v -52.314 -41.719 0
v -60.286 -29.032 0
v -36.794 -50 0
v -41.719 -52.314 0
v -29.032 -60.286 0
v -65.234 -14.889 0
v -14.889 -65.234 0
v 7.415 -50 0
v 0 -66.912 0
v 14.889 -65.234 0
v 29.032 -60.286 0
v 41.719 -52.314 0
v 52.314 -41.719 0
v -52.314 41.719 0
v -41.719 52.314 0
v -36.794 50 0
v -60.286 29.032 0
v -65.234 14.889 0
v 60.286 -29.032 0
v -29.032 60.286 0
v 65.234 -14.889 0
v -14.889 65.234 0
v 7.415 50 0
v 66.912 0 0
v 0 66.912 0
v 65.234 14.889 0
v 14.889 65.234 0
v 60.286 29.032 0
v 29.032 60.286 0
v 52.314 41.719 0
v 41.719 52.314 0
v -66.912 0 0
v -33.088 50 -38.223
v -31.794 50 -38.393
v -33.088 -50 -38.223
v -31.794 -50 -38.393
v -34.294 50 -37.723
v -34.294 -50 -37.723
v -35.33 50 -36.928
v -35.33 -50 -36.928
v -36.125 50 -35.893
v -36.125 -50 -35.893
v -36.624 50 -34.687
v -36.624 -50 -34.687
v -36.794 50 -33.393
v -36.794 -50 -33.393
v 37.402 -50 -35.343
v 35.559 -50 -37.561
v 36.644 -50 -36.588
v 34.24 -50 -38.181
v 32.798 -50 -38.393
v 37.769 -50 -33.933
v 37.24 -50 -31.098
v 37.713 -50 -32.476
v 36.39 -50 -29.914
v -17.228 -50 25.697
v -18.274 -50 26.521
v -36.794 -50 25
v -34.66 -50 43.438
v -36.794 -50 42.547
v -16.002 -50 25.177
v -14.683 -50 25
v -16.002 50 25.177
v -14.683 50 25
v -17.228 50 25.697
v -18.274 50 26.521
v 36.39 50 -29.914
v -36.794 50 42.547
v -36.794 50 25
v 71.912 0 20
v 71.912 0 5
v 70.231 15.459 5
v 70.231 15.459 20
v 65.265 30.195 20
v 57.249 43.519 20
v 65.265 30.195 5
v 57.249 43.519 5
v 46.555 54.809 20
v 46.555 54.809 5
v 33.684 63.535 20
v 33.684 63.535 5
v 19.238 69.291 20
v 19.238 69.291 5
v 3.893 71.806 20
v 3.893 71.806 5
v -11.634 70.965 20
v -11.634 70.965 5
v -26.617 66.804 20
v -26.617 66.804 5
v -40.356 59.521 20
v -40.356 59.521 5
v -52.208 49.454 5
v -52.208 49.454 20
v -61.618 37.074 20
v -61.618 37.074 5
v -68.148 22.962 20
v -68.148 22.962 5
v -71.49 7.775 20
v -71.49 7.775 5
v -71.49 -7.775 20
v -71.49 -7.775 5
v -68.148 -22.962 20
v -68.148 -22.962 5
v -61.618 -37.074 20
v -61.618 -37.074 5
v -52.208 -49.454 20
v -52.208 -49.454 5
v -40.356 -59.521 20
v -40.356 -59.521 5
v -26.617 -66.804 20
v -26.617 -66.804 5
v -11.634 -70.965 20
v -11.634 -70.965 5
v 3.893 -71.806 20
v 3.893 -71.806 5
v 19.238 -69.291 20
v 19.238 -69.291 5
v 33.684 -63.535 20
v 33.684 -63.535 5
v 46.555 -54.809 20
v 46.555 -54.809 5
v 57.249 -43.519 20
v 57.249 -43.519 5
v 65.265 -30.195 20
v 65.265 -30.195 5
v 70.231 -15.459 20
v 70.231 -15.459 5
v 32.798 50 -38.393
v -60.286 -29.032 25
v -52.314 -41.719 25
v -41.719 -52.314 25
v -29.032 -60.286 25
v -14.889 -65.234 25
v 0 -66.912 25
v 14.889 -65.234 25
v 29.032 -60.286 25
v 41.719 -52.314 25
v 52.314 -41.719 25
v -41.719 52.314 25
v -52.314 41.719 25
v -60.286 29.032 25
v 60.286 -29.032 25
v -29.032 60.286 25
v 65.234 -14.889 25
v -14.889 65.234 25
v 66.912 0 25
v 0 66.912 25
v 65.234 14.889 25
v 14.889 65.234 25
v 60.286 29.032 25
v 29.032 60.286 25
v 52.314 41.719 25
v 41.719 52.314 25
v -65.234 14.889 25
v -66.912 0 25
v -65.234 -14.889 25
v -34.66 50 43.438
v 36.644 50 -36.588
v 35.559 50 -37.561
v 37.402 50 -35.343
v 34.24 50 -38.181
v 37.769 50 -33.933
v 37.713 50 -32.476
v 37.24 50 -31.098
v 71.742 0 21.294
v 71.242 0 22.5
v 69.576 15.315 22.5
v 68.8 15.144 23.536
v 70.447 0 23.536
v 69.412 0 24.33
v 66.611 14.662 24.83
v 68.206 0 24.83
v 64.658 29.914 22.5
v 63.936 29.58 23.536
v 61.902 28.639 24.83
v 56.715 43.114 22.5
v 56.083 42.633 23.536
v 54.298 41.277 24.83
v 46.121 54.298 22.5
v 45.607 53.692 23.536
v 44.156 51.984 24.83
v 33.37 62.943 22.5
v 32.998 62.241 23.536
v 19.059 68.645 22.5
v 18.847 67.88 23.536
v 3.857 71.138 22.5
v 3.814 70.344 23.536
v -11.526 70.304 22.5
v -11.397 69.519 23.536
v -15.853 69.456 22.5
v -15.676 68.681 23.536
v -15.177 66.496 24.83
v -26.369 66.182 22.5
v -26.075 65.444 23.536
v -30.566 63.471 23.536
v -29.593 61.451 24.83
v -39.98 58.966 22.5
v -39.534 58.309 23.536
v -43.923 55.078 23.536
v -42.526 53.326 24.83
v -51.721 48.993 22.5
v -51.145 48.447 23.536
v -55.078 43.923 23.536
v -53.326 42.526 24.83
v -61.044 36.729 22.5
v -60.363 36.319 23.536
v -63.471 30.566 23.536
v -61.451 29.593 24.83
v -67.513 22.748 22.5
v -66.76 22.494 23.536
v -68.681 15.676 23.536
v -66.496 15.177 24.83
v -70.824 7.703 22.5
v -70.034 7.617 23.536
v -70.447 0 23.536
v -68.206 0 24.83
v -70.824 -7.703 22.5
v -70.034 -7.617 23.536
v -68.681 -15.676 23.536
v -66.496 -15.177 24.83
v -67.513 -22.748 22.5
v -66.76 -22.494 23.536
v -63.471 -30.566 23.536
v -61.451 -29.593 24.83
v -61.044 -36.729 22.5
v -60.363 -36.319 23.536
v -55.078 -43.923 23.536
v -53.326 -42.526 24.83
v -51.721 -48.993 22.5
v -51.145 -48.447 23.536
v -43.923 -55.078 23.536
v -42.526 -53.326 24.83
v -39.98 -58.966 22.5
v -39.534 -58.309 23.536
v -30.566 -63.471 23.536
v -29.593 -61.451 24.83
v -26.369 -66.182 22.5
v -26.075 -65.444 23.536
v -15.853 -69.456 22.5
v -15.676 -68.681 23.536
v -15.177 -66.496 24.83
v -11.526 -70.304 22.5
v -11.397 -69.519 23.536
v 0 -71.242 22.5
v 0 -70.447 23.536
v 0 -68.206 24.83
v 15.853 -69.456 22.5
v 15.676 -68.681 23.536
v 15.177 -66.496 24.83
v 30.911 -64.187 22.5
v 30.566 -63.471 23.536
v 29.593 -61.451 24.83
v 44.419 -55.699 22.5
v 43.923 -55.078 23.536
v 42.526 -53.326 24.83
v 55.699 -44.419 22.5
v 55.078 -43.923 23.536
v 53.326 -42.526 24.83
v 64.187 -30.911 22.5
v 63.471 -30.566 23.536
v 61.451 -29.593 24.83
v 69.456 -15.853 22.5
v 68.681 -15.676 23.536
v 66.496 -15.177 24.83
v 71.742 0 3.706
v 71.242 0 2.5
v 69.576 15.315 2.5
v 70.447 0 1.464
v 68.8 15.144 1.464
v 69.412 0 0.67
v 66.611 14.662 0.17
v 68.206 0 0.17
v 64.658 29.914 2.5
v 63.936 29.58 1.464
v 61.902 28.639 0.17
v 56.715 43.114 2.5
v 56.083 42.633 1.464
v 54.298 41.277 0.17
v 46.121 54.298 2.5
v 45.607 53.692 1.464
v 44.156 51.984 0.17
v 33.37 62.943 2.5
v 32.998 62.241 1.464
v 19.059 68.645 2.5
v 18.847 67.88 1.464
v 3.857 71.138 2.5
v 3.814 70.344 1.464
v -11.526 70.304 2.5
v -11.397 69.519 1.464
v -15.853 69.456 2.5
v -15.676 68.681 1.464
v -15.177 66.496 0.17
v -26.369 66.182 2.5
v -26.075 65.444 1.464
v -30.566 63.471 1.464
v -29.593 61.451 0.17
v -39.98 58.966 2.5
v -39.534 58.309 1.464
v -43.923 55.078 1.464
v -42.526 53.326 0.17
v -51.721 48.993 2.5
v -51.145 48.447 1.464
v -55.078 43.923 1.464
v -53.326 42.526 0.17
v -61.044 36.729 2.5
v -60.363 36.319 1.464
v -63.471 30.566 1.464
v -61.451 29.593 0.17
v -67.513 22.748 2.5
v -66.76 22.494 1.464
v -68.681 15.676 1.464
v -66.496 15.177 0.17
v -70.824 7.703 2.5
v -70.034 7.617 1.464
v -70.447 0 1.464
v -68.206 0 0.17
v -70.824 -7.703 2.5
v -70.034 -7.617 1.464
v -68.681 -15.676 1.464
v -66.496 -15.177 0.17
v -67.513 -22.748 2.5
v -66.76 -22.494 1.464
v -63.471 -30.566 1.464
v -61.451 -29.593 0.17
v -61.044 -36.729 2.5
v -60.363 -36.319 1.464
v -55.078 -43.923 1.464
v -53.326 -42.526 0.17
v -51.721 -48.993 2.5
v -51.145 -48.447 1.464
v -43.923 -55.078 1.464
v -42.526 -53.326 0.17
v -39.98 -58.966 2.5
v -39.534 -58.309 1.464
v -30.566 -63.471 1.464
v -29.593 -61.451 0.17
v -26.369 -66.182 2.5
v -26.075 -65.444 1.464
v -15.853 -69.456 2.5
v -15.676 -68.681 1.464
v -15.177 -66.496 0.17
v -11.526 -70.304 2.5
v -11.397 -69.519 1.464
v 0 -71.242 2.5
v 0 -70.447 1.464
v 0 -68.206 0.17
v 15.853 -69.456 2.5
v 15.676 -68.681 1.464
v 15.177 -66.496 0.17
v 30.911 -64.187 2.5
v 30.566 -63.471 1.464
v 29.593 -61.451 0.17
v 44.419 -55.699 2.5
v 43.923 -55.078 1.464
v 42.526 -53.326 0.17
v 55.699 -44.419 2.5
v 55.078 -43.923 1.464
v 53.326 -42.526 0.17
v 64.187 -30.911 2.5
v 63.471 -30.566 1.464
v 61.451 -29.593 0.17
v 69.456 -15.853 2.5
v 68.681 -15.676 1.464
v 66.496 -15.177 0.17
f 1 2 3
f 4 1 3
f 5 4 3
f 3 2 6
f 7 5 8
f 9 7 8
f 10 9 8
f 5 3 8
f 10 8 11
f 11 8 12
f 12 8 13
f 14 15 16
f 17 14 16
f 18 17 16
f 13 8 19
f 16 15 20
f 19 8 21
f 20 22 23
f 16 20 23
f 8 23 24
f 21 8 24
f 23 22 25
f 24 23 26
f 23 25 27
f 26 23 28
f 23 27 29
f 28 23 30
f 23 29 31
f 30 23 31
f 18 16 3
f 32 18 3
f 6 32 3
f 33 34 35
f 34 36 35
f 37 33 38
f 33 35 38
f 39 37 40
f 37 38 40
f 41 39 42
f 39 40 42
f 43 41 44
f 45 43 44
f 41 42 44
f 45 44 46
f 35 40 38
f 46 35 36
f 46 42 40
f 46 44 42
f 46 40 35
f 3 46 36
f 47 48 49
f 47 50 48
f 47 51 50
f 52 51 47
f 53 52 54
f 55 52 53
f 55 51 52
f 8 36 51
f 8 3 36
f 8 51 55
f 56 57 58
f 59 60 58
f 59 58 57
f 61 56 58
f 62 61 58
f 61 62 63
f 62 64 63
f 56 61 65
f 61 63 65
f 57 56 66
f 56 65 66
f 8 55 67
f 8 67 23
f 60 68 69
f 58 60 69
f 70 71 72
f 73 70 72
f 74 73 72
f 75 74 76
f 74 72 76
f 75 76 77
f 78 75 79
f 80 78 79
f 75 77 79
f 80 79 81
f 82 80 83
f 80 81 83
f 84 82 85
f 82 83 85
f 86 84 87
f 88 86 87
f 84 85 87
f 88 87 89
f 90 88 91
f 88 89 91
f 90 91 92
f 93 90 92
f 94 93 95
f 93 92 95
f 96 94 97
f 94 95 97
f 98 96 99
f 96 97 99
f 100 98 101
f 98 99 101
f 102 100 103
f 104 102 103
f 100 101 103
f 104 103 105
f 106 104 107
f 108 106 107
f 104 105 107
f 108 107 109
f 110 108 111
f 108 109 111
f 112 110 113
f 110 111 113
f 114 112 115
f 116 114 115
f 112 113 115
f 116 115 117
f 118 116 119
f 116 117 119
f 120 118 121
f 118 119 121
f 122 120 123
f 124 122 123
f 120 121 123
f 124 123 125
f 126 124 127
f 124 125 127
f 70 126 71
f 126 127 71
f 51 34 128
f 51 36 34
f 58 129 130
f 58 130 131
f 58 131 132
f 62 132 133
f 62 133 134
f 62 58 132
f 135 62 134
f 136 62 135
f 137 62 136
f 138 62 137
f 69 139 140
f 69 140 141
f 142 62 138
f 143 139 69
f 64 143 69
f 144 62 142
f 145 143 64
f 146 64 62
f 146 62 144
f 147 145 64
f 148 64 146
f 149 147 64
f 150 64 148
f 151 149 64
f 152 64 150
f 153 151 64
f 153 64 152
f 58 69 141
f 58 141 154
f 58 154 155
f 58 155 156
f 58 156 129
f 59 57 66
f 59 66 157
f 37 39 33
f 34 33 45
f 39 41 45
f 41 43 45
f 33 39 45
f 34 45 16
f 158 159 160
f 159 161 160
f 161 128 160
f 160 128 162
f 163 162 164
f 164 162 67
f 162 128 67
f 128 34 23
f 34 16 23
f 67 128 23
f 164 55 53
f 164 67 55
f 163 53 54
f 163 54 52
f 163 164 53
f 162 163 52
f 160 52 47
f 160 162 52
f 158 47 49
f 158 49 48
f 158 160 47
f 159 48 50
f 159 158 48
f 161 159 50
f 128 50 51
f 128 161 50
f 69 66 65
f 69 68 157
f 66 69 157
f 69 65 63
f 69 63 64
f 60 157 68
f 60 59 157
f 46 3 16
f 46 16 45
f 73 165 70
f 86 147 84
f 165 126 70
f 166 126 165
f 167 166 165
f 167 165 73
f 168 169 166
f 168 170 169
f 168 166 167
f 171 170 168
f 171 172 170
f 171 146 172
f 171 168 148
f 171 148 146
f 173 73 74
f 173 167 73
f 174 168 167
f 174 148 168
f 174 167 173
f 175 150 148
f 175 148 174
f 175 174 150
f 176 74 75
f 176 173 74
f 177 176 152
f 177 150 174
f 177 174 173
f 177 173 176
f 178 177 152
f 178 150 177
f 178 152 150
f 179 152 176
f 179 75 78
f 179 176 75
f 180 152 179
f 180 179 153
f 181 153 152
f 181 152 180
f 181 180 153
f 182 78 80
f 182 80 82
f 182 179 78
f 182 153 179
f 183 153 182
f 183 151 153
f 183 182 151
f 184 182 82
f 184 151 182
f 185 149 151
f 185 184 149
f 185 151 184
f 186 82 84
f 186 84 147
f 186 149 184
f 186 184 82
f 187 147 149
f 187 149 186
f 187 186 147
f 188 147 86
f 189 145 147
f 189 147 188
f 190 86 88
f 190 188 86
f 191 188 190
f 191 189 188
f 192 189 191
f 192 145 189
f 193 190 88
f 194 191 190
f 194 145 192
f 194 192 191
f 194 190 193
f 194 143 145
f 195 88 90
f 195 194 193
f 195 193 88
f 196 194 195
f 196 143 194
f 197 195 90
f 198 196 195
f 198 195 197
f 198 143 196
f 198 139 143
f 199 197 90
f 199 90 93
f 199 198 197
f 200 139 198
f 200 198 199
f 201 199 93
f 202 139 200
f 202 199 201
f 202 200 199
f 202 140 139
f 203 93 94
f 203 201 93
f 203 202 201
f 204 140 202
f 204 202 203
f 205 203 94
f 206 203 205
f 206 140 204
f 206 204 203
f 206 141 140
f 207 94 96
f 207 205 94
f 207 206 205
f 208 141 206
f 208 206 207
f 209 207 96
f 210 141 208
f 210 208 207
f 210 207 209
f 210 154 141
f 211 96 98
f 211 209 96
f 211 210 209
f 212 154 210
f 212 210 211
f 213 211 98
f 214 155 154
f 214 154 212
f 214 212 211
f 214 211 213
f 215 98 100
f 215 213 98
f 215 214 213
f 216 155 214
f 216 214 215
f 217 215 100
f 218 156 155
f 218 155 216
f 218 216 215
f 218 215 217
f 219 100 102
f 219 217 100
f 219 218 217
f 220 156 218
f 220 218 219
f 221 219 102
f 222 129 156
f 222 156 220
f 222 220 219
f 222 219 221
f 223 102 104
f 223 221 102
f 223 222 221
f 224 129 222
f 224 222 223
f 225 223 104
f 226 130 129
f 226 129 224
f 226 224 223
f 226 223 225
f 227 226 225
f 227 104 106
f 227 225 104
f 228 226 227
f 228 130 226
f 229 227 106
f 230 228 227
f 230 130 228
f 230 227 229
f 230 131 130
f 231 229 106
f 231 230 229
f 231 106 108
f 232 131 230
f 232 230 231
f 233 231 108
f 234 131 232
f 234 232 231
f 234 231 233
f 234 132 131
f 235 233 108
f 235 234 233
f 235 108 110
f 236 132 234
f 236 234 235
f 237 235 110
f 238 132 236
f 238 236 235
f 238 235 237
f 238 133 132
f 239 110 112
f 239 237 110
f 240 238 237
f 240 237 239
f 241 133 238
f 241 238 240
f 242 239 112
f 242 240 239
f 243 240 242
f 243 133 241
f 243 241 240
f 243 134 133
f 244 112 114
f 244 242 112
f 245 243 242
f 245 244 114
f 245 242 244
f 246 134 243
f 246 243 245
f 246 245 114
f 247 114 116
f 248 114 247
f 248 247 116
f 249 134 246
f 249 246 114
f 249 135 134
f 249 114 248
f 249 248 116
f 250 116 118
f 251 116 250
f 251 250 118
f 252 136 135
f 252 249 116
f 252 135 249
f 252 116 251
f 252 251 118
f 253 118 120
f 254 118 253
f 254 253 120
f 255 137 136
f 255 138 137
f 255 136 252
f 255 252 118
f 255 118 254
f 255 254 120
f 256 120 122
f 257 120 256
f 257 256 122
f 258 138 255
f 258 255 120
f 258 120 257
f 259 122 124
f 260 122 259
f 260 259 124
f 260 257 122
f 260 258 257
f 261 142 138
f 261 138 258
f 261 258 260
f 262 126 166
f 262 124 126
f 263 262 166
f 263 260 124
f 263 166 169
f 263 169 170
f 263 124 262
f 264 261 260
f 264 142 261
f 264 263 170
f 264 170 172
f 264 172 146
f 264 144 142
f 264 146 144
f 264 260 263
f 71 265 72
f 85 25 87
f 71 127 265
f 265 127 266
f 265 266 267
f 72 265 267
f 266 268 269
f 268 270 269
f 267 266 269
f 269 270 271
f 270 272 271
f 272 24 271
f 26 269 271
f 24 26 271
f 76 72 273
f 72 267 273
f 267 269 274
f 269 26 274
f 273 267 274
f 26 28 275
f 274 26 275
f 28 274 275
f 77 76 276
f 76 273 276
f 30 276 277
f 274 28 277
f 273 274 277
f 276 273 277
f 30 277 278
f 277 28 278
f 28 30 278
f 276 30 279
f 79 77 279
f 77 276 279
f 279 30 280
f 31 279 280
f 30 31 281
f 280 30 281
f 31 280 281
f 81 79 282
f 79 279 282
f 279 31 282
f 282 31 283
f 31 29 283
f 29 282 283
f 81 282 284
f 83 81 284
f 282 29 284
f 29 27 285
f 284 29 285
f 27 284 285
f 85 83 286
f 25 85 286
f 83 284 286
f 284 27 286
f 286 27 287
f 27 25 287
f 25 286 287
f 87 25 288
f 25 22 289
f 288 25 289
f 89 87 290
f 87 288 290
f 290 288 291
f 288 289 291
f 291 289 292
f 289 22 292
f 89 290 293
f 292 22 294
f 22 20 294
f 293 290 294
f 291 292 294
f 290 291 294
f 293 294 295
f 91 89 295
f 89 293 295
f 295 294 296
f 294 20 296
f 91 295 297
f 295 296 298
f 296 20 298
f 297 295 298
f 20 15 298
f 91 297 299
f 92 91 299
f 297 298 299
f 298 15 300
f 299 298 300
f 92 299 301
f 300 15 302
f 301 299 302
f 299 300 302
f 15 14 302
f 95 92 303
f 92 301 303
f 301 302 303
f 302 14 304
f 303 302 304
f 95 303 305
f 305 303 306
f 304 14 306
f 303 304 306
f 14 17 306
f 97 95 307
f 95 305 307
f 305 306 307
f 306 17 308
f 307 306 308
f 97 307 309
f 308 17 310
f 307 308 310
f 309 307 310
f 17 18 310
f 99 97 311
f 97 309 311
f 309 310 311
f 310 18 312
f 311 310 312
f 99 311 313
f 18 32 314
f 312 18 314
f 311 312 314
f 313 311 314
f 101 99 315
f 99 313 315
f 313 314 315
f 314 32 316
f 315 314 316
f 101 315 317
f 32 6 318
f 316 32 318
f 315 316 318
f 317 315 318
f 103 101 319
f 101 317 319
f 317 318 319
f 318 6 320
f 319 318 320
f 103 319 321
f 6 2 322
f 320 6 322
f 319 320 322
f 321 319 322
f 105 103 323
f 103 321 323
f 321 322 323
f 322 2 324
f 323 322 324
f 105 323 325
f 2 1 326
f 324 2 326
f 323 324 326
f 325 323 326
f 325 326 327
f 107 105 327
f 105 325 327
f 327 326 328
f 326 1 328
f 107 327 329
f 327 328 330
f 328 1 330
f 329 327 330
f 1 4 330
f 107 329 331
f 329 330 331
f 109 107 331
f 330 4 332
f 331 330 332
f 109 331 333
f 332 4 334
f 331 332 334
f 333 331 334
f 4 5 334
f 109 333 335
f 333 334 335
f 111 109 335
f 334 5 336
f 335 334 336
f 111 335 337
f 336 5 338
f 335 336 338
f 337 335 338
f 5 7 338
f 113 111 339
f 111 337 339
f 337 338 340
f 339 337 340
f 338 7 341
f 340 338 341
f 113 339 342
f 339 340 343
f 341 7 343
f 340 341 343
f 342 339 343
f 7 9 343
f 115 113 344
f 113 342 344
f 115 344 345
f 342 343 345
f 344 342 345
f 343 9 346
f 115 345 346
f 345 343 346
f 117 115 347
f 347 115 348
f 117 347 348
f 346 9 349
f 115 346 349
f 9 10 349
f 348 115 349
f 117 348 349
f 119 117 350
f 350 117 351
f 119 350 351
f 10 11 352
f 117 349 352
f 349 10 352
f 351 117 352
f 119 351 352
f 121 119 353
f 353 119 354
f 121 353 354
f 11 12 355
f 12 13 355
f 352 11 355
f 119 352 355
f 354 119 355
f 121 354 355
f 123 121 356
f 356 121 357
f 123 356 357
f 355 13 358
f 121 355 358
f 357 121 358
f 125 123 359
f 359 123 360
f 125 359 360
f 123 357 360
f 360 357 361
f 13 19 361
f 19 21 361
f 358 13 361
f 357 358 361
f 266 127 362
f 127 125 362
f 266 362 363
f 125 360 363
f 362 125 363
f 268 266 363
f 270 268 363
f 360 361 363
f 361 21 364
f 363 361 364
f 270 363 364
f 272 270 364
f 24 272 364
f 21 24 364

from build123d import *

# Parameters (mm, degrees)
F0_R     = 71.9118919296
F1_DEPTH = 25
F3_DEPTH = 50
F4_R     = 5
F5_R     = 5
F6_R     = 5
F7_R     = 5
F8_R     = 5


with BuildPart() as f1:
    # F0 (on Top) → F1 (new body)
    with BuildSketch(Plane.XY):
        Circle(F0_R)
    extrude(amount=F1_DEPTH)

    # F2 (on Front) → F3 (join, symmetric)
    with BuildSketch(Plane.XZ):
        Polygon((-34.6600189805, 43.438449502), (-36.7943756282, 42.5470620394), (-36.7943756282, -38.3929647505), (44.6020886302, -38.3929647505), align=None)
    extrude(amount=F3_DEPTH, both=True)

    # F4
    f4_edges = [f1.edges().sort_by_distance(p)[0] for p in [
        (44.602089, 0, -38.392965),
    ]]
    fillet(f4_edges, radius=F4_R)

    # F5
    f5_edges = [f1.edges().sort_by_distance(p)[0] for p in [
        (-36.794376, 0, -38.392965),
    ]]
    fillet(f5_edges, radius=F5_R)

    # F6
    f6_edges = [f1.edges().sort_by_distance(p)[0] for p in [
        (-71.911892, 0, 25),
    ]]
    fillet(f6_edges, radius=F6_R)

    # F7
    f7_edges = [f1.edges().sort_by_distance(p)[0] for p in [
        (-71.911892, 0, 0),
    ]]
    fillet(f7_edges, radius=F7_R)

    # F8
    f8_edges = [f1.edges().sort_by_distance(p)[0] for p in [
        (-16.800492, 0, 25),
    ]]
    fillet(f8_edges, radius=F8_R)


solid = f1.part
